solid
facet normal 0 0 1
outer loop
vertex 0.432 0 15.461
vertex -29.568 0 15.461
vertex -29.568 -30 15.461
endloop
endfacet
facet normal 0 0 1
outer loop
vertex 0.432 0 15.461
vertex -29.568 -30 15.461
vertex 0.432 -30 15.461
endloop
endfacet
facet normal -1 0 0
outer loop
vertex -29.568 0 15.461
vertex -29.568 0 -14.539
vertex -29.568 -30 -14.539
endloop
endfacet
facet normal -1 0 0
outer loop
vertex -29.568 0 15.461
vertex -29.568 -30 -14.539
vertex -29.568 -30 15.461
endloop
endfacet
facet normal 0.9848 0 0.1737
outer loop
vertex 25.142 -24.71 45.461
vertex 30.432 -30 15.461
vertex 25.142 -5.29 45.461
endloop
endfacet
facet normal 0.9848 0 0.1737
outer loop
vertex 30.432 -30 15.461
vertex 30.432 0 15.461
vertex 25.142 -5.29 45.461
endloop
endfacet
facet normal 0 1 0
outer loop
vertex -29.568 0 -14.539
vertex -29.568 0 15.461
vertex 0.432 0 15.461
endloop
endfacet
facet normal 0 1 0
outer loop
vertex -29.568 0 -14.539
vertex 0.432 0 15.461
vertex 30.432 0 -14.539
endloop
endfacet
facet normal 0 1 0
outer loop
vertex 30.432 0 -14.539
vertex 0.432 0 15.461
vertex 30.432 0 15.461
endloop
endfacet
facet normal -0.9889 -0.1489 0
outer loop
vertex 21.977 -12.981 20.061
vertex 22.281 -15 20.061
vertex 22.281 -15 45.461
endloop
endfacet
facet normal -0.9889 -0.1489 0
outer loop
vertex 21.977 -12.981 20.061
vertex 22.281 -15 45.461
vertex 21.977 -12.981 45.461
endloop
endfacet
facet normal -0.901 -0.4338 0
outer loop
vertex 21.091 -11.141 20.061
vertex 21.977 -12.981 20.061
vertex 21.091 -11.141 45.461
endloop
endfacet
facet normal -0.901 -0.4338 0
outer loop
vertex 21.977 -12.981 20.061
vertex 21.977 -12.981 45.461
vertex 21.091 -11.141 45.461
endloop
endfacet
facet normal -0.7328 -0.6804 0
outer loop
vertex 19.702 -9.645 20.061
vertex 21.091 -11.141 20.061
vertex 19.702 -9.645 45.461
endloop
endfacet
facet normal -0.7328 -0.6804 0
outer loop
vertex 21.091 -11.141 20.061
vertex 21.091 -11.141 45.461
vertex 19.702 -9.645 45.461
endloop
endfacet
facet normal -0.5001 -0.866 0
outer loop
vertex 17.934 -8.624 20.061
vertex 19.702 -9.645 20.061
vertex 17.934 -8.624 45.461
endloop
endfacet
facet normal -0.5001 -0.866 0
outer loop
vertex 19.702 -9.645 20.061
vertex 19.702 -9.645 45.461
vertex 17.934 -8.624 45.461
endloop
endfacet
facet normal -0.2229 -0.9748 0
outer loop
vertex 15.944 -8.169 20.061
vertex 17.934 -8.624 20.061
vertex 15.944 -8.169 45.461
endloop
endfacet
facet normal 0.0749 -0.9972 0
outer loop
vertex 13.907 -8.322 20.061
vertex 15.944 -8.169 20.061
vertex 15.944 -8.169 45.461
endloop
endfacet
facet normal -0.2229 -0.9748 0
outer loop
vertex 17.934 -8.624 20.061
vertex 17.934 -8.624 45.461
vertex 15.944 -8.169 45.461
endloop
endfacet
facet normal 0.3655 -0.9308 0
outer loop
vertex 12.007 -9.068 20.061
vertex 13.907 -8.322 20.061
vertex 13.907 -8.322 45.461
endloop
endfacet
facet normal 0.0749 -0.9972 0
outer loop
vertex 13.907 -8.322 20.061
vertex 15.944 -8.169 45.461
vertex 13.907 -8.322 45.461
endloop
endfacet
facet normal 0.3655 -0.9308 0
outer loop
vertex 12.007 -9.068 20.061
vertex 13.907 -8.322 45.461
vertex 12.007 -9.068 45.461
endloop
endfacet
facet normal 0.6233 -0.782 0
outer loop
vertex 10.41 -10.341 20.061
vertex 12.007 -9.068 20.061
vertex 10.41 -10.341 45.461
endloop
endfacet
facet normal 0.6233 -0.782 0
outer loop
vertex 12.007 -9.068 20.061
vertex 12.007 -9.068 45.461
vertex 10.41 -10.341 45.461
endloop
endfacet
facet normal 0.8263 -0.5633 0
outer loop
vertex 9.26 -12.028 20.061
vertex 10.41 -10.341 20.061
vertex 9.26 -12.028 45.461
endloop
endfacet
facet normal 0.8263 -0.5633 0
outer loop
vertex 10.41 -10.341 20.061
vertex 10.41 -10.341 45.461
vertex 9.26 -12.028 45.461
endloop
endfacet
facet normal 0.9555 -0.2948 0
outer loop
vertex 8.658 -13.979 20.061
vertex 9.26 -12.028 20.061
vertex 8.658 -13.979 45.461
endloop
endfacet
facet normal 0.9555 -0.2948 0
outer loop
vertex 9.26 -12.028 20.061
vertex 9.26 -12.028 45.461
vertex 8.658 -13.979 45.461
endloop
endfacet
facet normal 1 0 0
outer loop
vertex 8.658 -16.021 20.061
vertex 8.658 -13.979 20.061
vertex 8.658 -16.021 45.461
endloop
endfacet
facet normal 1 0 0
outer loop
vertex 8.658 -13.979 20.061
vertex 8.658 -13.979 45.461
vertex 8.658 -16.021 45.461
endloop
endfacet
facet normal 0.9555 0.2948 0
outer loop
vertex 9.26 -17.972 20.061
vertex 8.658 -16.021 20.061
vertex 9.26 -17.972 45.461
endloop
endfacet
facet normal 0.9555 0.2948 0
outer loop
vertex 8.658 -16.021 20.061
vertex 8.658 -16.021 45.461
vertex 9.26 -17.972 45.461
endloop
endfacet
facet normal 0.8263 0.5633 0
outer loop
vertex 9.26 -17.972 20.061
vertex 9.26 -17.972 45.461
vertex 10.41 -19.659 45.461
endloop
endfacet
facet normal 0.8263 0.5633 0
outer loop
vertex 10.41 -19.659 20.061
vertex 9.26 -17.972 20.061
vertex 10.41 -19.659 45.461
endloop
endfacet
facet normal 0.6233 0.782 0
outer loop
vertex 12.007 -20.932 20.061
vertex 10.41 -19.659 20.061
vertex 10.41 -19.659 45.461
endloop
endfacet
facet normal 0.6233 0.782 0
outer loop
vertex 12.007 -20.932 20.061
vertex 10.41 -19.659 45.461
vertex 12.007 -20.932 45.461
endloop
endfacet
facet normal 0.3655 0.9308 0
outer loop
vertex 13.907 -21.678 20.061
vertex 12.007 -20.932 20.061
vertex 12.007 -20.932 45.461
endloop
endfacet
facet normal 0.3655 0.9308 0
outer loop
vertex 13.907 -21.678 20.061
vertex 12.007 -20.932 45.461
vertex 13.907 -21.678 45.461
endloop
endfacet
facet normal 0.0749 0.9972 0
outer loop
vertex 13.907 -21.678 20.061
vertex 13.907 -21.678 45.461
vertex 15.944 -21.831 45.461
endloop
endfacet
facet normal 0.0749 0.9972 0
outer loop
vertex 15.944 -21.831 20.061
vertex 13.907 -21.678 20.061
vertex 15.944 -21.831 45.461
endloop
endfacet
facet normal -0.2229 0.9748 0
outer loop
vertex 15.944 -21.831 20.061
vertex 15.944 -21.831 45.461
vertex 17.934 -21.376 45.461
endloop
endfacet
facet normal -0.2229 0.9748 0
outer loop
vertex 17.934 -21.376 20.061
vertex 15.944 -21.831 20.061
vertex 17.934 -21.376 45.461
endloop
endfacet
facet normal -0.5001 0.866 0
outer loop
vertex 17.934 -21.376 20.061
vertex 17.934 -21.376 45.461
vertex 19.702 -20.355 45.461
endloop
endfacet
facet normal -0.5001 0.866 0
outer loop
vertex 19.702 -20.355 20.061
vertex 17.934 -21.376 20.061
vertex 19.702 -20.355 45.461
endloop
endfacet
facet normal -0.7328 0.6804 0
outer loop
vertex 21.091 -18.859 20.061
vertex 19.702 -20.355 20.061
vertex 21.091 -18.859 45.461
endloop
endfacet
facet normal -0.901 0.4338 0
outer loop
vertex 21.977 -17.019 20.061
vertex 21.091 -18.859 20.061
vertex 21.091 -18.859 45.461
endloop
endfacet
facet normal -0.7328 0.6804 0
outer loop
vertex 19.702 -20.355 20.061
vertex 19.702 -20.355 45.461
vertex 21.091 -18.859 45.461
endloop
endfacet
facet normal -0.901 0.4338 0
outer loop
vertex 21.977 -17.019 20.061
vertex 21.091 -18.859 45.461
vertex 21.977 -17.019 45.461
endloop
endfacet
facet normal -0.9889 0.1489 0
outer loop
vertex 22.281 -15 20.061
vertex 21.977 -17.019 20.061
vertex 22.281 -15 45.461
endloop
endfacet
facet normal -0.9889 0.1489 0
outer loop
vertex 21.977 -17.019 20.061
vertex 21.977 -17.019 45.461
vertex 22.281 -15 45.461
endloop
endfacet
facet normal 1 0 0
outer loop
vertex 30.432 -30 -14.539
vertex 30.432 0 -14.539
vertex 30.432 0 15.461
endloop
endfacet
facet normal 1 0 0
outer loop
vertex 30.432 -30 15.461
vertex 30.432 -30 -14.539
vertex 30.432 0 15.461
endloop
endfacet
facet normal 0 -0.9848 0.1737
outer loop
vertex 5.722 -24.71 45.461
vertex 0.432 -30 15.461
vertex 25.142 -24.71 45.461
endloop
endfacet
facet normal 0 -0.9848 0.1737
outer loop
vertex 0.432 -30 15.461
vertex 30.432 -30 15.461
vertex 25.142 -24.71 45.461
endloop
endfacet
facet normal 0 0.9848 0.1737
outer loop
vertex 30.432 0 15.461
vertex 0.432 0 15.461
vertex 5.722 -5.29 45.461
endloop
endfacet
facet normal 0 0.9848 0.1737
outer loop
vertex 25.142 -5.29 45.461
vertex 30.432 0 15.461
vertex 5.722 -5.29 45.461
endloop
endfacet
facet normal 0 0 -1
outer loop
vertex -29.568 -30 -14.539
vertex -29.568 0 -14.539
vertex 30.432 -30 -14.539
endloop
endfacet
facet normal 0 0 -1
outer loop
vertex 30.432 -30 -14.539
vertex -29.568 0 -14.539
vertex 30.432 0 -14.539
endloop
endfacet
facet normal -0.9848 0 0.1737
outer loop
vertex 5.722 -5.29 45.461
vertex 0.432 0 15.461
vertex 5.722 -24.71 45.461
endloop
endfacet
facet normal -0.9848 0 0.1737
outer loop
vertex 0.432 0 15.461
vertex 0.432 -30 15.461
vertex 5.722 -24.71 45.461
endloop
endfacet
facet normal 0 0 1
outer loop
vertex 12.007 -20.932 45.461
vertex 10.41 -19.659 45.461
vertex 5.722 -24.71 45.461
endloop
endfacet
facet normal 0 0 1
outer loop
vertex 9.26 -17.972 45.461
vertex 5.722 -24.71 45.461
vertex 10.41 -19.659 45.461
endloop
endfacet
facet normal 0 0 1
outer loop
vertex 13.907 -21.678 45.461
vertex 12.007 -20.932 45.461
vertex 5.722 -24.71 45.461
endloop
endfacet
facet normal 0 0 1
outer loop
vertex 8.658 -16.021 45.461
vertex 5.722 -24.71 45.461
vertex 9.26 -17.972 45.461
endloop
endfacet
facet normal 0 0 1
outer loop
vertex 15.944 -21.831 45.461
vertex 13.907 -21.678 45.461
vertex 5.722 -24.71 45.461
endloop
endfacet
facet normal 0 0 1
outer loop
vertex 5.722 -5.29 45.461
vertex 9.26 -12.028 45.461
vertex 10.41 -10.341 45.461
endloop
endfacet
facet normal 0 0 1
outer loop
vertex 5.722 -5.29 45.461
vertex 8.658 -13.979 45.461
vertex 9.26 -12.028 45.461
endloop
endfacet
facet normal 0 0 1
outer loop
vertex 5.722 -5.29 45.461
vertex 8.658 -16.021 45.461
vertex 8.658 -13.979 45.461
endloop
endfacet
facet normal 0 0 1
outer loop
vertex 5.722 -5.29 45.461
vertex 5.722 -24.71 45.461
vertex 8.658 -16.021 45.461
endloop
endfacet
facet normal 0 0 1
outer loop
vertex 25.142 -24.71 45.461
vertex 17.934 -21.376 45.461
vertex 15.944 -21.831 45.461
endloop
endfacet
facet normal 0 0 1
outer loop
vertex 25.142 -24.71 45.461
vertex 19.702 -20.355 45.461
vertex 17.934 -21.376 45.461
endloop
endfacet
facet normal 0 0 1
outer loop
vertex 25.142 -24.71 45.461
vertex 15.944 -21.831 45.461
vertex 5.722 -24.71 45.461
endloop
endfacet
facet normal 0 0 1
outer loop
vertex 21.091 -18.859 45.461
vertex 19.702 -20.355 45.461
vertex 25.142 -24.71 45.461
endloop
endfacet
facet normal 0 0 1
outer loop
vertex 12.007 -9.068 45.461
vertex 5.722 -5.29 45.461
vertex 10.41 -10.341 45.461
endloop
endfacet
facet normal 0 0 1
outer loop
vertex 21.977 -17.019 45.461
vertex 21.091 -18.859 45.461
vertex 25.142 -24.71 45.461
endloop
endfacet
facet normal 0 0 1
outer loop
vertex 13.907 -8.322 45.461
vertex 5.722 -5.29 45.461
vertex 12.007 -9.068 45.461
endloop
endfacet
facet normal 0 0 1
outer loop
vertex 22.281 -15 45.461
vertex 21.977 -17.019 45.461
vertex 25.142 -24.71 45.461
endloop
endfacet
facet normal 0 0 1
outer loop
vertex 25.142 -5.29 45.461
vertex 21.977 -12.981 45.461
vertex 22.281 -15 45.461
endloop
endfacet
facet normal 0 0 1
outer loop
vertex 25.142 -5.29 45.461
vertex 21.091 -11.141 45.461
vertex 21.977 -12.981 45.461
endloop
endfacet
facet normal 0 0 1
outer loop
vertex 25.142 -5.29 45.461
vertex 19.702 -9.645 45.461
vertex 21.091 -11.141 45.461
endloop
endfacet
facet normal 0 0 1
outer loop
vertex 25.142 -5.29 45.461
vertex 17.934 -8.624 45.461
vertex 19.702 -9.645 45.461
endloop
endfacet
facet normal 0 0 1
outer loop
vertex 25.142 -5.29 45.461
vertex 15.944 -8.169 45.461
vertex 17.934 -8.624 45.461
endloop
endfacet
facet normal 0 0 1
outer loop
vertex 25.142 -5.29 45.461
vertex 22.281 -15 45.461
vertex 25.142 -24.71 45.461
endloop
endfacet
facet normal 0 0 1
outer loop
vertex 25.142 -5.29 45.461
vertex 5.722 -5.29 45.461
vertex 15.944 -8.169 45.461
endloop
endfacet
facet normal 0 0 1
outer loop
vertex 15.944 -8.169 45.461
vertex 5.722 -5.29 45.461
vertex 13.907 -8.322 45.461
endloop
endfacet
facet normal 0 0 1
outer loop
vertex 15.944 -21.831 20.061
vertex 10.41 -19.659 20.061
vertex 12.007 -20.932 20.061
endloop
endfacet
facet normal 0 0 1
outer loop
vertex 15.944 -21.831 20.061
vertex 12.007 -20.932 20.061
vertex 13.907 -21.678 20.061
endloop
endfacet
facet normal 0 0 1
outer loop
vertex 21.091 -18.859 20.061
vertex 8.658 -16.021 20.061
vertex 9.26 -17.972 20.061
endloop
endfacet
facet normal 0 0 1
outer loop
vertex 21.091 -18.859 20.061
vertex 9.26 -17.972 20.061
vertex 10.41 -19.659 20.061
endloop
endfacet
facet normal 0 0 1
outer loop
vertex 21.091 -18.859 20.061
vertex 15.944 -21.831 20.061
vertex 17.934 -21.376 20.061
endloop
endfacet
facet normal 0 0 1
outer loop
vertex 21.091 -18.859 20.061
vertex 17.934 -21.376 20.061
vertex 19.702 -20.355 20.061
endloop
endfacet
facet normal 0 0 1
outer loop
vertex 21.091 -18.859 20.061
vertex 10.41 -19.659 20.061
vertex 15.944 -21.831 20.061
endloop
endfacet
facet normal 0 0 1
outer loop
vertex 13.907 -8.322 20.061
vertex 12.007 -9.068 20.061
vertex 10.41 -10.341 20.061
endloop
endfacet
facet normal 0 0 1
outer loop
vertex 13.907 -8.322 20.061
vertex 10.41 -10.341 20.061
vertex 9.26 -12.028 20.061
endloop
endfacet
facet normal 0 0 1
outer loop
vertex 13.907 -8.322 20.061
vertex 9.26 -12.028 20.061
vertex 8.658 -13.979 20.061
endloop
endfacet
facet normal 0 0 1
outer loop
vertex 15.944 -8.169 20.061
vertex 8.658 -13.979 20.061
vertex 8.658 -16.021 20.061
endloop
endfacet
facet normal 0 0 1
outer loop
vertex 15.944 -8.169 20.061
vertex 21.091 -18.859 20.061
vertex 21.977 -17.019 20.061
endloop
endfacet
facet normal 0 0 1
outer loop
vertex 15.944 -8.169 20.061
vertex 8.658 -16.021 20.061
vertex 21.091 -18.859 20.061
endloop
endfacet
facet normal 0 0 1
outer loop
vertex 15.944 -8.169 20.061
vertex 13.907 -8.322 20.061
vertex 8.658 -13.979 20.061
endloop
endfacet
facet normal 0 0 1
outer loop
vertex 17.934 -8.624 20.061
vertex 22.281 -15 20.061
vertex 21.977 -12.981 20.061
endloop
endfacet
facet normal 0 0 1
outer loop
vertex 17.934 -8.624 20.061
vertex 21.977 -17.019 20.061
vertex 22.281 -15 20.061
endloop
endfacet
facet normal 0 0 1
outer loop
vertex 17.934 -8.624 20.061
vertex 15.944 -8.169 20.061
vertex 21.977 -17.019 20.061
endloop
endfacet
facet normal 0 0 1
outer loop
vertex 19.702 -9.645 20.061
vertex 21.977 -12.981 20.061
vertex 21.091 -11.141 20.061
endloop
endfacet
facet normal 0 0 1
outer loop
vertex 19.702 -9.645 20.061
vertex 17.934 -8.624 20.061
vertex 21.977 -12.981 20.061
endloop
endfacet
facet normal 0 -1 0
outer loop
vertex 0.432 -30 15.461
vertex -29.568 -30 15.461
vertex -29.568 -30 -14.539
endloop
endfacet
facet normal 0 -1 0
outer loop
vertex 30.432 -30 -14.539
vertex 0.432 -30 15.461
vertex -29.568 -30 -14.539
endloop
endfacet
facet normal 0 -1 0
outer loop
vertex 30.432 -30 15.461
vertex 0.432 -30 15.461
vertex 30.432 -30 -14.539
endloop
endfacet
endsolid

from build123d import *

# Parameters (mm, degrees)
F0_W     = 60
F0_H     = 30
F1_DEPTH = 30
F2_W     = 30
F2_H     = 30
F3_DEPTH = 30
F3_TAPER = 10
F4_R     = 6.8497431599
F5_DEPTH = 25.4


with BuildPart() as f1:
    # F0 (on Front) → F1 (new body)
    with BuildSketch(Plane.XZ):
        with Locations((0.4317071289, 0.4612154852)):
            Rectangle(F0_W, F0_H)
    extrude(amount=F1_DEPTH)

    # F2 (on face) → F3 (join)
    with BuildSketch(Plane.XY.offset(15.4612154852)):
        with Locations((15.4317071289, -15)):
            Rectangle(F2_W, F2_H)
    extrude(amount=F3_DEPTH, taper=F3_TAPER)

    # F4 (on face) → F5 (cut)
    with BuildSketch(Plane.XY.offset(45.4612154852)):
        with Locations((15.4317071289, -15)):
            Circle(F4_R)
    extrude(amount=-F5_DEPTH, mode=Mode.SUBTRACT)


solid = f1.part
